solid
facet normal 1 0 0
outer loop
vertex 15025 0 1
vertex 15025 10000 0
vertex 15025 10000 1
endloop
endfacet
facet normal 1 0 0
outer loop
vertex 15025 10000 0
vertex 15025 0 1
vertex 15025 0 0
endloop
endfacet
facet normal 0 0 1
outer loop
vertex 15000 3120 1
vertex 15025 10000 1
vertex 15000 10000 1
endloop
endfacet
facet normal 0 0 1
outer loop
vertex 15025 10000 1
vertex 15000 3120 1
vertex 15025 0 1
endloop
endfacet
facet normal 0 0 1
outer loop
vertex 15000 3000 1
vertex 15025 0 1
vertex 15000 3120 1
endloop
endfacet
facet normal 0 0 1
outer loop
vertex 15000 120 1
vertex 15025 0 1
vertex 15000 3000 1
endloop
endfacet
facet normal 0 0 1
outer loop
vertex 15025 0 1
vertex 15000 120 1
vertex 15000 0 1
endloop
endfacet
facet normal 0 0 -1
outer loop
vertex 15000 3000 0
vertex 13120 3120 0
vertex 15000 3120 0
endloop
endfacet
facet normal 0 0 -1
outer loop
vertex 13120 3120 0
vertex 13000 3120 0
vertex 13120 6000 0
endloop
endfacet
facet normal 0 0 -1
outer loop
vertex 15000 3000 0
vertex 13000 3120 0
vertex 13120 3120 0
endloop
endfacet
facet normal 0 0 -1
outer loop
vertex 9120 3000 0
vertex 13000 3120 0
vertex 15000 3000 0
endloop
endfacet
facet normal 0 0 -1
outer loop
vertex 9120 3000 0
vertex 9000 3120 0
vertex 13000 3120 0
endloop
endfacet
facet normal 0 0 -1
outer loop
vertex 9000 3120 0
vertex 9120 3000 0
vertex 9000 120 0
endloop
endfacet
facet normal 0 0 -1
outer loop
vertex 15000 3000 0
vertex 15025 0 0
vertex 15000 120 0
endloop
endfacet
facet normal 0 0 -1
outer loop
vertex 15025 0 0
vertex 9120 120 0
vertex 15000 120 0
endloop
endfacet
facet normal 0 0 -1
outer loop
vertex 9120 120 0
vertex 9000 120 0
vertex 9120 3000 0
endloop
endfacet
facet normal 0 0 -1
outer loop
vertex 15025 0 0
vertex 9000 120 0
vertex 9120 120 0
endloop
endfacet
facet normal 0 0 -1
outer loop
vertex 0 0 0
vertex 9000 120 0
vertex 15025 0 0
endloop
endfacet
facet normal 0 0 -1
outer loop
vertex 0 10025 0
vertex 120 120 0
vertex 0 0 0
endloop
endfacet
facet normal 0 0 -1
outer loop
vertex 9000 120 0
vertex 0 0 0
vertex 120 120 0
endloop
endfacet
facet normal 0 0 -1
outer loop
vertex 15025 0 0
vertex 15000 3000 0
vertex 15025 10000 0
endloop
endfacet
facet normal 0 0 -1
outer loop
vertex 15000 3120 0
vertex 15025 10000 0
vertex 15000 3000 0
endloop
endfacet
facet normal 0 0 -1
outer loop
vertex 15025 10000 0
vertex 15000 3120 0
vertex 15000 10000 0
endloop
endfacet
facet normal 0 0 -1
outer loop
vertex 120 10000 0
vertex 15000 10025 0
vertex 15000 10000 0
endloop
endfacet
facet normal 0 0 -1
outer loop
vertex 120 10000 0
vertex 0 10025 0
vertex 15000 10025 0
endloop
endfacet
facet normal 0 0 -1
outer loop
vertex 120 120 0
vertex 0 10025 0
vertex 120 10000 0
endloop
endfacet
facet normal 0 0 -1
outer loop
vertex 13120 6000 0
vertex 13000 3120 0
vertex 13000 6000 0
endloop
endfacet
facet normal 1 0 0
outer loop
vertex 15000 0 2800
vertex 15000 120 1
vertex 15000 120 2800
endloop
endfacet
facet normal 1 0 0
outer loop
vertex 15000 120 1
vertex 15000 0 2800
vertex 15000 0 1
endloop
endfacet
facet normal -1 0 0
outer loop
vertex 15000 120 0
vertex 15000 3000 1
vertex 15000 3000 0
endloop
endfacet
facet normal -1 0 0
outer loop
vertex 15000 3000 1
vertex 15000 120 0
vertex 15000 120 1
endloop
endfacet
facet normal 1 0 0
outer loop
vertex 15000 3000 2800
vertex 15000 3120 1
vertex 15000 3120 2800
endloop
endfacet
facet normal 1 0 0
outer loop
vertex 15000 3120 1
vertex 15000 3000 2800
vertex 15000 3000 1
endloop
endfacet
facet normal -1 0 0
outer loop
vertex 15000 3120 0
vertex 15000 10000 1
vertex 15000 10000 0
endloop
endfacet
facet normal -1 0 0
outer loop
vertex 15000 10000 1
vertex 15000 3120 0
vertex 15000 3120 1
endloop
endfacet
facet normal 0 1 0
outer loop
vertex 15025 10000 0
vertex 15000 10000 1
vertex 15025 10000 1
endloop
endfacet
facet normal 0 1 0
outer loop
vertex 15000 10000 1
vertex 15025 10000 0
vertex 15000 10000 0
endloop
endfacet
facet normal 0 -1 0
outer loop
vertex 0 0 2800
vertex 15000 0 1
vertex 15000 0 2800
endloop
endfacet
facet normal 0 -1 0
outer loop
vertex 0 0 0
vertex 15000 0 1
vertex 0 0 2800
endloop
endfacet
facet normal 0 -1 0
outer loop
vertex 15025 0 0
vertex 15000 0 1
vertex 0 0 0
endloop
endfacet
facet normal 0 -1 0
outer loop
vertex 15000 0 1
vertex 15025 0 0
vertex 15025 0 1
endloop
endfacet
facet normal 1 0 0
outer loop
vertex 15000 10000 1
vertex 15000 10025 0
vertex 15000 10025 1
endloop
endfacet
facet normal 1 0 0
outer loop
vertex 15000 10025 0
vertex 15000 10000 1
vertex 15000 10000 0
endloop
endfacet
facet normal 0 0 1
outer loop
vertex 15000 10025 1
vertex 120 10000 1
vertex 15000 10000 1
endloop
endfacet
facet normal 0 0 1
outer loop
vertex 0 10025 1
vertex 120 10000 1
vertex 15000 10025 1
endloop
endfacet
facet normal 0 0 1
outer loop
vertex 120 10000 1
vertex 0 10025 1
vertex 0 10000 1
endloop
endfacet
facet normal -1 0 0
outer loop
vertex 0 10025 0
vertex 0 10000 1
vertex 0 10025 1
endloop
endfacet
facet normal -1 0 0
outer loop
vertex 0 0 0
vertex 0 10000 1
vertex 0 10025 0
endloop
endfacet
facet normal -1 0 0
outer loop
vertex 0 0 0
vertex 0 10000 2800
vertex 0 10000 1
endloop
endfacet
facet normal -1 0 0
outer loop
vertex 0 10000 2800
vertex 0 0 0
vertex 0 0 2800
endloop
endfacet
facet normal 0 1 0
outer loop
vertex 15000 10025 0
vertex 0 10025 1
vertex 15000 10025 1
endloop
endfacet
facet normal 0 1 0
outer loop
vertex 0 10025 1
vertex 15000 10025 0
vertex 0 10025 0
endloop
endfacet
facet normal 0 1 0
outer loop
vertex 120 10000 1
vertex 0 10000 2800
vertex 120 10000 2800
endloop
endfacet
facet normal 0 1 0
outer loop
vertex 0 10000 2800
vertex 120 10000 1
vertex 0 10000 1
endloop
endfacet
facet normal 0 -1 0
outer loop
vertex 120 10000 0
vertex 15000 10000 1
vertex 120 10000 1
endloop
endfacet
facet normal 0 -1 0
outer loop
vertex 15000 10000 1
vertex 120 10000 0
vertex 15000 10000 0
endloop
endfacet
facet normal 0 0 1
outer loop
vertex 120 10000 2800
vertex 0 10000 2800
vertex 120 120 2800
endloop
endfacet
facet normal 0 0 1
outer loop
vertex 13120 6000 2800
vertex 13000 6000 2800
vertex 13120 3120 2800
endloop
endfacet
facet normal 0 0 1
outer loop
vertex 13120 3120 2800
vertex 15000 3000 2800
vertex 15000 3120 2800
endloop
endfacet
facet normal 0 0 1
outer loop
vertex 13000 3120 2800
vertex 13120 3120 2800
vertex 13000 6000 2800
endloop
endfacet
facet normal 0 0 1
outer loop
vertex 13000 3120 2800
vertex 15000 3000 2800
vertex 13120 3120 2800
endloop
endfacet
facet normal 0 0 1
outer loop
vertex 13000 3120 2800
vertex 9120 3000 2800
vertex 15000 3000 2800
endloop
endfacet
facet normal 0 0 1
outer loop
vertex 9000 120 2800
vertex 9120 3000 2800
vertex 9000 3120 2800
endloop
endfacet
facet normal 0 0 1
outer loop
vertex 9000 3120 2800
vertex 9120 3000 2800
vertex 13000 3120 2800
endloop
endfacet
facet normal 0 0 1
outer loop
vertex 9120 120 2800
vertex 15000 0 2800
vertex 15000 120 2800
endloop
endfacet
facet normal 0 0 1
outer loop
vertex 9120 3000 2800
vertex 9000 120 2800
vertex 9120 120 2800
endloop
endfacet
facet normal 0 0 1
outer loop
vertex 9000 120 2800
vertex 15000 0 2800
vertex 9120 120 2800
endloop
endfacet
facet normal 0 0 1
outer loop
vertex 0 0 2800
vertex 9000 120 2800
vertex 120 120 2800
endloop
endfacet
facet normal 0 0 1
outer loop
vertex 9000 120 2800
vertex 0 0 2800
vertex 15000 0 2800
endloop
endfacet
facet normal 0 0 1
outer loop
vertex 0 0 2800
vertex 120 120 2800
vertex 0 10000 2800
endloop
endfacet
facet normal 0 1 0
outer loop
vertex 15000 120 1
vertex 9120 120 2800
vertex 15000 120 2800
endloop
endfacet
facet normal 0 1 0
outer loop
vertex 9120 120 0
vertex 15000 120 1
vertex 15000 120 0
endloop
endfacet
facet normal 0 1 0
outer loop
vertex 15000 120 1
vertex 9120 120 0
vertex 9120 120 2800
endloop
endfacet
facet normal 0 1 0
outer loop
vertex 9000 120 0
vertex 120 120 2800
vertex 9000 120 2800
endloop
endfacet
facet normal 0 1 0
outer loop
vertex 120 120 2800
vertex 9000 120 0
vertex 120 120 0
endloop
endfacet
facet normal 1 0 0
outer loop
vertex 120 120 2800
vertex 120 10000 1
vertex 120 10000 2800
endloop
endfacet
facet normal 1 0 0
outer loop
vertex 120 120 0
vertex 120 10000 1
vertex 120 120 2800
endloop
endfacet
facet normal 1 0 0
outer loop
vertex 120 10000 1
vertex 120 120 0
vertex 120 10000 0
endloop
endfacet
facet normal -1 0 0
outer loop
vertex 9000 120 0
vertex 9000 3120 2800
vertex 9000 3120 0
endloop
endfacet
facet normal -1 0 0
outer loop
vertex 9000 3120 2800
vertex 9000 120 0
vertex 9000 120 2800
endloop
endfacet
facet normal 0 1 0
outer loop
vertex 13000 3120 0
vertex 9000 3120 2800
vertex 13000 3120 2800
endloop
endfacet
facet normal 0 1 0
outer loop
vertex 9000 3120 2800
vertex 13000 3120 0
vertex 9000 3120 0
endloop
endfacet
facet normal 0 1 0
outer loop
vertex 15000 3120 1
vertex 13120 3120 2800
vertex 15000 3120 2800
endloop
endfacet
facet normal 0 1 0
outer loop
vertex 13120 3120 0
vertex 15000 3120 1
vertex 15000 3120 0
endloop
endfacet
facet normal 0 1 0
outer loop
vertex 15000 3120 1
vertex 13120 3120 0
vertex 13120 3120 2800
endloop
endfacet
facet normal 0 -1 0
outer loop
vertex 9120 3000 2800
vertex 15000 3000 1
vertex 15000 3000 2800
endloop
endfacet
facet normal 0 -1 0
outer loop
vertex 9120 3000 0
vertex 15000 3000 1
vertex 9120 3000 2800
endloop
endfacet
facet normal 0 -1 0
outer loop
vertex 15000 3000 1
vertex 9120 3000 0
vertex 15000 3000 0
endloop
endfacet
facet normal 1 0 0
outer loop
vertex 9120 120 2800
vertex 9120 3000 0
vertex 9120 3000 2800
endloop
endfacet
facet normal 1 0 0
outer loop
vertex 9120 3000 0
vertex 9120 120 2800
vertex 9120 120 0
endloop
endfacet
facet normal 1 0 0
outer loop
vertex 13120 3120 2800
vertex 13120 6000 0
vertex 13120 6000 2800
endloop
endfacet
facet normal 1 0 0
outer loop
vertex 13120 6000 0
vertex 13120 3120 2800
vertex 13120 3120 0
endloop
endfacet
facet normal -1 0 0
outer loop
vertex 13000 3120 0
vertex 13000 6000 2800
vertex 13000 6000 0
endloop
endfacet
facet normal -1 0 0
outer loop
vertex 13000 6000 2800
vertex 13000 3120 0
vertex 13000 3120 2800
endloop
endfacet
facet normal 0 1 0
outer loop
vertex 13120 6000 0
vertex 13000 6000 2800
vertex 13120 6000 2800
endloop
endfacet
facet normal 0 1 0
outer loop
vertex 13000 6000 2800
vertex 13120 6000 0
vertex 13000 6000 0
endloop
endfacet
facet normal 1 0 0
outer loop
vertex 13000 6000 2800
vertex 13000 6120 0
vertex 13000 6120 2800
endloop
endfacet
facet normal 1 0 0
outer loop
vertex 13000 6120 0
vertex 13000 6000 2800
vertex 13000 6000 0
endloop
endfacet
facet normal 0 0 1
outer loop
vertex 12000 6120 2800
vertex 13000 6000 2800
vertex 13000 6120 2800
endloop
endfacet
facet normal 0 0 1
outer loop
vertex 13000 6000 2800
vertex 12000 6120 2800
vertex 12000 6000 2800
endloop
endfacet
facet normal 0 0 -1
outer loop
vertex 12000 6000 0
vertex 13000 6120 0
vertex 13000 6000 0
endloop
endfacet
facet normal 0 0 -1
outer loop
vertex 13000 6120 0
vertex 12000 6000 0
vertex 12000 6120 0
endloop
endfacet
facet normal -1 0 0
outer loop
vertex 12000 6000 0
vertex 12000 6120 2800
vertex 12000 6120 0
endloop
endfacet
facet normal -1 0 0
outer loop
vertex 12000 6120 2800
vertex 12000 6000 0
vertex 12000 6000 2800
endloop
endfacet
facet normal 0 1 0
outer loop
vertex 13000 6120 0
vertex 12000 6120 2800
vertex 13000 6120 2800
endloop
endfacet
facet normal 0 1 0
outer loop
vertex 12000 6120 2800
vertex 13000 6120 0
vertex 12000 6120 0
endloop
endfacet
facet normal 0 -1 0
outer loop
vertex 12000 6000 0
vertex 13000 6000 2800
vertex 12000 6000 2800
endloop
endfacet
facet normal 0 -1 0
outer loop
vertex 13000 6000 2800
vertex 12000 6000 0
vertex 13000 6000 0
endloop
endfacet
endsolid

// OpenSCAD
// LINEA LIMITE
color("#000")
union() {
    translate([15000, 0, 0])
    cube([25, 10000, 1]);
    
    translate([0, 10000, 0])
    cube([15000, 25, 1]);
}


grueso_barda=120;

// BARDA ESRUADRA
color("#bdc3c7")
union() {
    cube([15000, grueso_barda, 2800]);
    cube([grueso_barda, 10000, 2800]);
}


// COCHERA
translate([9000, 3000, 0])
cube([6000, grueso_barda, 2800]);
translate([9000, 0, 0])
cube([grueso_barda, 3000, 2800]);


//
translate([13000, 3000, 0])
cube([grueso_barda, 3000, 2800]);
translate([12000, 6000, 0])
cube([1000, grueso_barda, 2800]);
